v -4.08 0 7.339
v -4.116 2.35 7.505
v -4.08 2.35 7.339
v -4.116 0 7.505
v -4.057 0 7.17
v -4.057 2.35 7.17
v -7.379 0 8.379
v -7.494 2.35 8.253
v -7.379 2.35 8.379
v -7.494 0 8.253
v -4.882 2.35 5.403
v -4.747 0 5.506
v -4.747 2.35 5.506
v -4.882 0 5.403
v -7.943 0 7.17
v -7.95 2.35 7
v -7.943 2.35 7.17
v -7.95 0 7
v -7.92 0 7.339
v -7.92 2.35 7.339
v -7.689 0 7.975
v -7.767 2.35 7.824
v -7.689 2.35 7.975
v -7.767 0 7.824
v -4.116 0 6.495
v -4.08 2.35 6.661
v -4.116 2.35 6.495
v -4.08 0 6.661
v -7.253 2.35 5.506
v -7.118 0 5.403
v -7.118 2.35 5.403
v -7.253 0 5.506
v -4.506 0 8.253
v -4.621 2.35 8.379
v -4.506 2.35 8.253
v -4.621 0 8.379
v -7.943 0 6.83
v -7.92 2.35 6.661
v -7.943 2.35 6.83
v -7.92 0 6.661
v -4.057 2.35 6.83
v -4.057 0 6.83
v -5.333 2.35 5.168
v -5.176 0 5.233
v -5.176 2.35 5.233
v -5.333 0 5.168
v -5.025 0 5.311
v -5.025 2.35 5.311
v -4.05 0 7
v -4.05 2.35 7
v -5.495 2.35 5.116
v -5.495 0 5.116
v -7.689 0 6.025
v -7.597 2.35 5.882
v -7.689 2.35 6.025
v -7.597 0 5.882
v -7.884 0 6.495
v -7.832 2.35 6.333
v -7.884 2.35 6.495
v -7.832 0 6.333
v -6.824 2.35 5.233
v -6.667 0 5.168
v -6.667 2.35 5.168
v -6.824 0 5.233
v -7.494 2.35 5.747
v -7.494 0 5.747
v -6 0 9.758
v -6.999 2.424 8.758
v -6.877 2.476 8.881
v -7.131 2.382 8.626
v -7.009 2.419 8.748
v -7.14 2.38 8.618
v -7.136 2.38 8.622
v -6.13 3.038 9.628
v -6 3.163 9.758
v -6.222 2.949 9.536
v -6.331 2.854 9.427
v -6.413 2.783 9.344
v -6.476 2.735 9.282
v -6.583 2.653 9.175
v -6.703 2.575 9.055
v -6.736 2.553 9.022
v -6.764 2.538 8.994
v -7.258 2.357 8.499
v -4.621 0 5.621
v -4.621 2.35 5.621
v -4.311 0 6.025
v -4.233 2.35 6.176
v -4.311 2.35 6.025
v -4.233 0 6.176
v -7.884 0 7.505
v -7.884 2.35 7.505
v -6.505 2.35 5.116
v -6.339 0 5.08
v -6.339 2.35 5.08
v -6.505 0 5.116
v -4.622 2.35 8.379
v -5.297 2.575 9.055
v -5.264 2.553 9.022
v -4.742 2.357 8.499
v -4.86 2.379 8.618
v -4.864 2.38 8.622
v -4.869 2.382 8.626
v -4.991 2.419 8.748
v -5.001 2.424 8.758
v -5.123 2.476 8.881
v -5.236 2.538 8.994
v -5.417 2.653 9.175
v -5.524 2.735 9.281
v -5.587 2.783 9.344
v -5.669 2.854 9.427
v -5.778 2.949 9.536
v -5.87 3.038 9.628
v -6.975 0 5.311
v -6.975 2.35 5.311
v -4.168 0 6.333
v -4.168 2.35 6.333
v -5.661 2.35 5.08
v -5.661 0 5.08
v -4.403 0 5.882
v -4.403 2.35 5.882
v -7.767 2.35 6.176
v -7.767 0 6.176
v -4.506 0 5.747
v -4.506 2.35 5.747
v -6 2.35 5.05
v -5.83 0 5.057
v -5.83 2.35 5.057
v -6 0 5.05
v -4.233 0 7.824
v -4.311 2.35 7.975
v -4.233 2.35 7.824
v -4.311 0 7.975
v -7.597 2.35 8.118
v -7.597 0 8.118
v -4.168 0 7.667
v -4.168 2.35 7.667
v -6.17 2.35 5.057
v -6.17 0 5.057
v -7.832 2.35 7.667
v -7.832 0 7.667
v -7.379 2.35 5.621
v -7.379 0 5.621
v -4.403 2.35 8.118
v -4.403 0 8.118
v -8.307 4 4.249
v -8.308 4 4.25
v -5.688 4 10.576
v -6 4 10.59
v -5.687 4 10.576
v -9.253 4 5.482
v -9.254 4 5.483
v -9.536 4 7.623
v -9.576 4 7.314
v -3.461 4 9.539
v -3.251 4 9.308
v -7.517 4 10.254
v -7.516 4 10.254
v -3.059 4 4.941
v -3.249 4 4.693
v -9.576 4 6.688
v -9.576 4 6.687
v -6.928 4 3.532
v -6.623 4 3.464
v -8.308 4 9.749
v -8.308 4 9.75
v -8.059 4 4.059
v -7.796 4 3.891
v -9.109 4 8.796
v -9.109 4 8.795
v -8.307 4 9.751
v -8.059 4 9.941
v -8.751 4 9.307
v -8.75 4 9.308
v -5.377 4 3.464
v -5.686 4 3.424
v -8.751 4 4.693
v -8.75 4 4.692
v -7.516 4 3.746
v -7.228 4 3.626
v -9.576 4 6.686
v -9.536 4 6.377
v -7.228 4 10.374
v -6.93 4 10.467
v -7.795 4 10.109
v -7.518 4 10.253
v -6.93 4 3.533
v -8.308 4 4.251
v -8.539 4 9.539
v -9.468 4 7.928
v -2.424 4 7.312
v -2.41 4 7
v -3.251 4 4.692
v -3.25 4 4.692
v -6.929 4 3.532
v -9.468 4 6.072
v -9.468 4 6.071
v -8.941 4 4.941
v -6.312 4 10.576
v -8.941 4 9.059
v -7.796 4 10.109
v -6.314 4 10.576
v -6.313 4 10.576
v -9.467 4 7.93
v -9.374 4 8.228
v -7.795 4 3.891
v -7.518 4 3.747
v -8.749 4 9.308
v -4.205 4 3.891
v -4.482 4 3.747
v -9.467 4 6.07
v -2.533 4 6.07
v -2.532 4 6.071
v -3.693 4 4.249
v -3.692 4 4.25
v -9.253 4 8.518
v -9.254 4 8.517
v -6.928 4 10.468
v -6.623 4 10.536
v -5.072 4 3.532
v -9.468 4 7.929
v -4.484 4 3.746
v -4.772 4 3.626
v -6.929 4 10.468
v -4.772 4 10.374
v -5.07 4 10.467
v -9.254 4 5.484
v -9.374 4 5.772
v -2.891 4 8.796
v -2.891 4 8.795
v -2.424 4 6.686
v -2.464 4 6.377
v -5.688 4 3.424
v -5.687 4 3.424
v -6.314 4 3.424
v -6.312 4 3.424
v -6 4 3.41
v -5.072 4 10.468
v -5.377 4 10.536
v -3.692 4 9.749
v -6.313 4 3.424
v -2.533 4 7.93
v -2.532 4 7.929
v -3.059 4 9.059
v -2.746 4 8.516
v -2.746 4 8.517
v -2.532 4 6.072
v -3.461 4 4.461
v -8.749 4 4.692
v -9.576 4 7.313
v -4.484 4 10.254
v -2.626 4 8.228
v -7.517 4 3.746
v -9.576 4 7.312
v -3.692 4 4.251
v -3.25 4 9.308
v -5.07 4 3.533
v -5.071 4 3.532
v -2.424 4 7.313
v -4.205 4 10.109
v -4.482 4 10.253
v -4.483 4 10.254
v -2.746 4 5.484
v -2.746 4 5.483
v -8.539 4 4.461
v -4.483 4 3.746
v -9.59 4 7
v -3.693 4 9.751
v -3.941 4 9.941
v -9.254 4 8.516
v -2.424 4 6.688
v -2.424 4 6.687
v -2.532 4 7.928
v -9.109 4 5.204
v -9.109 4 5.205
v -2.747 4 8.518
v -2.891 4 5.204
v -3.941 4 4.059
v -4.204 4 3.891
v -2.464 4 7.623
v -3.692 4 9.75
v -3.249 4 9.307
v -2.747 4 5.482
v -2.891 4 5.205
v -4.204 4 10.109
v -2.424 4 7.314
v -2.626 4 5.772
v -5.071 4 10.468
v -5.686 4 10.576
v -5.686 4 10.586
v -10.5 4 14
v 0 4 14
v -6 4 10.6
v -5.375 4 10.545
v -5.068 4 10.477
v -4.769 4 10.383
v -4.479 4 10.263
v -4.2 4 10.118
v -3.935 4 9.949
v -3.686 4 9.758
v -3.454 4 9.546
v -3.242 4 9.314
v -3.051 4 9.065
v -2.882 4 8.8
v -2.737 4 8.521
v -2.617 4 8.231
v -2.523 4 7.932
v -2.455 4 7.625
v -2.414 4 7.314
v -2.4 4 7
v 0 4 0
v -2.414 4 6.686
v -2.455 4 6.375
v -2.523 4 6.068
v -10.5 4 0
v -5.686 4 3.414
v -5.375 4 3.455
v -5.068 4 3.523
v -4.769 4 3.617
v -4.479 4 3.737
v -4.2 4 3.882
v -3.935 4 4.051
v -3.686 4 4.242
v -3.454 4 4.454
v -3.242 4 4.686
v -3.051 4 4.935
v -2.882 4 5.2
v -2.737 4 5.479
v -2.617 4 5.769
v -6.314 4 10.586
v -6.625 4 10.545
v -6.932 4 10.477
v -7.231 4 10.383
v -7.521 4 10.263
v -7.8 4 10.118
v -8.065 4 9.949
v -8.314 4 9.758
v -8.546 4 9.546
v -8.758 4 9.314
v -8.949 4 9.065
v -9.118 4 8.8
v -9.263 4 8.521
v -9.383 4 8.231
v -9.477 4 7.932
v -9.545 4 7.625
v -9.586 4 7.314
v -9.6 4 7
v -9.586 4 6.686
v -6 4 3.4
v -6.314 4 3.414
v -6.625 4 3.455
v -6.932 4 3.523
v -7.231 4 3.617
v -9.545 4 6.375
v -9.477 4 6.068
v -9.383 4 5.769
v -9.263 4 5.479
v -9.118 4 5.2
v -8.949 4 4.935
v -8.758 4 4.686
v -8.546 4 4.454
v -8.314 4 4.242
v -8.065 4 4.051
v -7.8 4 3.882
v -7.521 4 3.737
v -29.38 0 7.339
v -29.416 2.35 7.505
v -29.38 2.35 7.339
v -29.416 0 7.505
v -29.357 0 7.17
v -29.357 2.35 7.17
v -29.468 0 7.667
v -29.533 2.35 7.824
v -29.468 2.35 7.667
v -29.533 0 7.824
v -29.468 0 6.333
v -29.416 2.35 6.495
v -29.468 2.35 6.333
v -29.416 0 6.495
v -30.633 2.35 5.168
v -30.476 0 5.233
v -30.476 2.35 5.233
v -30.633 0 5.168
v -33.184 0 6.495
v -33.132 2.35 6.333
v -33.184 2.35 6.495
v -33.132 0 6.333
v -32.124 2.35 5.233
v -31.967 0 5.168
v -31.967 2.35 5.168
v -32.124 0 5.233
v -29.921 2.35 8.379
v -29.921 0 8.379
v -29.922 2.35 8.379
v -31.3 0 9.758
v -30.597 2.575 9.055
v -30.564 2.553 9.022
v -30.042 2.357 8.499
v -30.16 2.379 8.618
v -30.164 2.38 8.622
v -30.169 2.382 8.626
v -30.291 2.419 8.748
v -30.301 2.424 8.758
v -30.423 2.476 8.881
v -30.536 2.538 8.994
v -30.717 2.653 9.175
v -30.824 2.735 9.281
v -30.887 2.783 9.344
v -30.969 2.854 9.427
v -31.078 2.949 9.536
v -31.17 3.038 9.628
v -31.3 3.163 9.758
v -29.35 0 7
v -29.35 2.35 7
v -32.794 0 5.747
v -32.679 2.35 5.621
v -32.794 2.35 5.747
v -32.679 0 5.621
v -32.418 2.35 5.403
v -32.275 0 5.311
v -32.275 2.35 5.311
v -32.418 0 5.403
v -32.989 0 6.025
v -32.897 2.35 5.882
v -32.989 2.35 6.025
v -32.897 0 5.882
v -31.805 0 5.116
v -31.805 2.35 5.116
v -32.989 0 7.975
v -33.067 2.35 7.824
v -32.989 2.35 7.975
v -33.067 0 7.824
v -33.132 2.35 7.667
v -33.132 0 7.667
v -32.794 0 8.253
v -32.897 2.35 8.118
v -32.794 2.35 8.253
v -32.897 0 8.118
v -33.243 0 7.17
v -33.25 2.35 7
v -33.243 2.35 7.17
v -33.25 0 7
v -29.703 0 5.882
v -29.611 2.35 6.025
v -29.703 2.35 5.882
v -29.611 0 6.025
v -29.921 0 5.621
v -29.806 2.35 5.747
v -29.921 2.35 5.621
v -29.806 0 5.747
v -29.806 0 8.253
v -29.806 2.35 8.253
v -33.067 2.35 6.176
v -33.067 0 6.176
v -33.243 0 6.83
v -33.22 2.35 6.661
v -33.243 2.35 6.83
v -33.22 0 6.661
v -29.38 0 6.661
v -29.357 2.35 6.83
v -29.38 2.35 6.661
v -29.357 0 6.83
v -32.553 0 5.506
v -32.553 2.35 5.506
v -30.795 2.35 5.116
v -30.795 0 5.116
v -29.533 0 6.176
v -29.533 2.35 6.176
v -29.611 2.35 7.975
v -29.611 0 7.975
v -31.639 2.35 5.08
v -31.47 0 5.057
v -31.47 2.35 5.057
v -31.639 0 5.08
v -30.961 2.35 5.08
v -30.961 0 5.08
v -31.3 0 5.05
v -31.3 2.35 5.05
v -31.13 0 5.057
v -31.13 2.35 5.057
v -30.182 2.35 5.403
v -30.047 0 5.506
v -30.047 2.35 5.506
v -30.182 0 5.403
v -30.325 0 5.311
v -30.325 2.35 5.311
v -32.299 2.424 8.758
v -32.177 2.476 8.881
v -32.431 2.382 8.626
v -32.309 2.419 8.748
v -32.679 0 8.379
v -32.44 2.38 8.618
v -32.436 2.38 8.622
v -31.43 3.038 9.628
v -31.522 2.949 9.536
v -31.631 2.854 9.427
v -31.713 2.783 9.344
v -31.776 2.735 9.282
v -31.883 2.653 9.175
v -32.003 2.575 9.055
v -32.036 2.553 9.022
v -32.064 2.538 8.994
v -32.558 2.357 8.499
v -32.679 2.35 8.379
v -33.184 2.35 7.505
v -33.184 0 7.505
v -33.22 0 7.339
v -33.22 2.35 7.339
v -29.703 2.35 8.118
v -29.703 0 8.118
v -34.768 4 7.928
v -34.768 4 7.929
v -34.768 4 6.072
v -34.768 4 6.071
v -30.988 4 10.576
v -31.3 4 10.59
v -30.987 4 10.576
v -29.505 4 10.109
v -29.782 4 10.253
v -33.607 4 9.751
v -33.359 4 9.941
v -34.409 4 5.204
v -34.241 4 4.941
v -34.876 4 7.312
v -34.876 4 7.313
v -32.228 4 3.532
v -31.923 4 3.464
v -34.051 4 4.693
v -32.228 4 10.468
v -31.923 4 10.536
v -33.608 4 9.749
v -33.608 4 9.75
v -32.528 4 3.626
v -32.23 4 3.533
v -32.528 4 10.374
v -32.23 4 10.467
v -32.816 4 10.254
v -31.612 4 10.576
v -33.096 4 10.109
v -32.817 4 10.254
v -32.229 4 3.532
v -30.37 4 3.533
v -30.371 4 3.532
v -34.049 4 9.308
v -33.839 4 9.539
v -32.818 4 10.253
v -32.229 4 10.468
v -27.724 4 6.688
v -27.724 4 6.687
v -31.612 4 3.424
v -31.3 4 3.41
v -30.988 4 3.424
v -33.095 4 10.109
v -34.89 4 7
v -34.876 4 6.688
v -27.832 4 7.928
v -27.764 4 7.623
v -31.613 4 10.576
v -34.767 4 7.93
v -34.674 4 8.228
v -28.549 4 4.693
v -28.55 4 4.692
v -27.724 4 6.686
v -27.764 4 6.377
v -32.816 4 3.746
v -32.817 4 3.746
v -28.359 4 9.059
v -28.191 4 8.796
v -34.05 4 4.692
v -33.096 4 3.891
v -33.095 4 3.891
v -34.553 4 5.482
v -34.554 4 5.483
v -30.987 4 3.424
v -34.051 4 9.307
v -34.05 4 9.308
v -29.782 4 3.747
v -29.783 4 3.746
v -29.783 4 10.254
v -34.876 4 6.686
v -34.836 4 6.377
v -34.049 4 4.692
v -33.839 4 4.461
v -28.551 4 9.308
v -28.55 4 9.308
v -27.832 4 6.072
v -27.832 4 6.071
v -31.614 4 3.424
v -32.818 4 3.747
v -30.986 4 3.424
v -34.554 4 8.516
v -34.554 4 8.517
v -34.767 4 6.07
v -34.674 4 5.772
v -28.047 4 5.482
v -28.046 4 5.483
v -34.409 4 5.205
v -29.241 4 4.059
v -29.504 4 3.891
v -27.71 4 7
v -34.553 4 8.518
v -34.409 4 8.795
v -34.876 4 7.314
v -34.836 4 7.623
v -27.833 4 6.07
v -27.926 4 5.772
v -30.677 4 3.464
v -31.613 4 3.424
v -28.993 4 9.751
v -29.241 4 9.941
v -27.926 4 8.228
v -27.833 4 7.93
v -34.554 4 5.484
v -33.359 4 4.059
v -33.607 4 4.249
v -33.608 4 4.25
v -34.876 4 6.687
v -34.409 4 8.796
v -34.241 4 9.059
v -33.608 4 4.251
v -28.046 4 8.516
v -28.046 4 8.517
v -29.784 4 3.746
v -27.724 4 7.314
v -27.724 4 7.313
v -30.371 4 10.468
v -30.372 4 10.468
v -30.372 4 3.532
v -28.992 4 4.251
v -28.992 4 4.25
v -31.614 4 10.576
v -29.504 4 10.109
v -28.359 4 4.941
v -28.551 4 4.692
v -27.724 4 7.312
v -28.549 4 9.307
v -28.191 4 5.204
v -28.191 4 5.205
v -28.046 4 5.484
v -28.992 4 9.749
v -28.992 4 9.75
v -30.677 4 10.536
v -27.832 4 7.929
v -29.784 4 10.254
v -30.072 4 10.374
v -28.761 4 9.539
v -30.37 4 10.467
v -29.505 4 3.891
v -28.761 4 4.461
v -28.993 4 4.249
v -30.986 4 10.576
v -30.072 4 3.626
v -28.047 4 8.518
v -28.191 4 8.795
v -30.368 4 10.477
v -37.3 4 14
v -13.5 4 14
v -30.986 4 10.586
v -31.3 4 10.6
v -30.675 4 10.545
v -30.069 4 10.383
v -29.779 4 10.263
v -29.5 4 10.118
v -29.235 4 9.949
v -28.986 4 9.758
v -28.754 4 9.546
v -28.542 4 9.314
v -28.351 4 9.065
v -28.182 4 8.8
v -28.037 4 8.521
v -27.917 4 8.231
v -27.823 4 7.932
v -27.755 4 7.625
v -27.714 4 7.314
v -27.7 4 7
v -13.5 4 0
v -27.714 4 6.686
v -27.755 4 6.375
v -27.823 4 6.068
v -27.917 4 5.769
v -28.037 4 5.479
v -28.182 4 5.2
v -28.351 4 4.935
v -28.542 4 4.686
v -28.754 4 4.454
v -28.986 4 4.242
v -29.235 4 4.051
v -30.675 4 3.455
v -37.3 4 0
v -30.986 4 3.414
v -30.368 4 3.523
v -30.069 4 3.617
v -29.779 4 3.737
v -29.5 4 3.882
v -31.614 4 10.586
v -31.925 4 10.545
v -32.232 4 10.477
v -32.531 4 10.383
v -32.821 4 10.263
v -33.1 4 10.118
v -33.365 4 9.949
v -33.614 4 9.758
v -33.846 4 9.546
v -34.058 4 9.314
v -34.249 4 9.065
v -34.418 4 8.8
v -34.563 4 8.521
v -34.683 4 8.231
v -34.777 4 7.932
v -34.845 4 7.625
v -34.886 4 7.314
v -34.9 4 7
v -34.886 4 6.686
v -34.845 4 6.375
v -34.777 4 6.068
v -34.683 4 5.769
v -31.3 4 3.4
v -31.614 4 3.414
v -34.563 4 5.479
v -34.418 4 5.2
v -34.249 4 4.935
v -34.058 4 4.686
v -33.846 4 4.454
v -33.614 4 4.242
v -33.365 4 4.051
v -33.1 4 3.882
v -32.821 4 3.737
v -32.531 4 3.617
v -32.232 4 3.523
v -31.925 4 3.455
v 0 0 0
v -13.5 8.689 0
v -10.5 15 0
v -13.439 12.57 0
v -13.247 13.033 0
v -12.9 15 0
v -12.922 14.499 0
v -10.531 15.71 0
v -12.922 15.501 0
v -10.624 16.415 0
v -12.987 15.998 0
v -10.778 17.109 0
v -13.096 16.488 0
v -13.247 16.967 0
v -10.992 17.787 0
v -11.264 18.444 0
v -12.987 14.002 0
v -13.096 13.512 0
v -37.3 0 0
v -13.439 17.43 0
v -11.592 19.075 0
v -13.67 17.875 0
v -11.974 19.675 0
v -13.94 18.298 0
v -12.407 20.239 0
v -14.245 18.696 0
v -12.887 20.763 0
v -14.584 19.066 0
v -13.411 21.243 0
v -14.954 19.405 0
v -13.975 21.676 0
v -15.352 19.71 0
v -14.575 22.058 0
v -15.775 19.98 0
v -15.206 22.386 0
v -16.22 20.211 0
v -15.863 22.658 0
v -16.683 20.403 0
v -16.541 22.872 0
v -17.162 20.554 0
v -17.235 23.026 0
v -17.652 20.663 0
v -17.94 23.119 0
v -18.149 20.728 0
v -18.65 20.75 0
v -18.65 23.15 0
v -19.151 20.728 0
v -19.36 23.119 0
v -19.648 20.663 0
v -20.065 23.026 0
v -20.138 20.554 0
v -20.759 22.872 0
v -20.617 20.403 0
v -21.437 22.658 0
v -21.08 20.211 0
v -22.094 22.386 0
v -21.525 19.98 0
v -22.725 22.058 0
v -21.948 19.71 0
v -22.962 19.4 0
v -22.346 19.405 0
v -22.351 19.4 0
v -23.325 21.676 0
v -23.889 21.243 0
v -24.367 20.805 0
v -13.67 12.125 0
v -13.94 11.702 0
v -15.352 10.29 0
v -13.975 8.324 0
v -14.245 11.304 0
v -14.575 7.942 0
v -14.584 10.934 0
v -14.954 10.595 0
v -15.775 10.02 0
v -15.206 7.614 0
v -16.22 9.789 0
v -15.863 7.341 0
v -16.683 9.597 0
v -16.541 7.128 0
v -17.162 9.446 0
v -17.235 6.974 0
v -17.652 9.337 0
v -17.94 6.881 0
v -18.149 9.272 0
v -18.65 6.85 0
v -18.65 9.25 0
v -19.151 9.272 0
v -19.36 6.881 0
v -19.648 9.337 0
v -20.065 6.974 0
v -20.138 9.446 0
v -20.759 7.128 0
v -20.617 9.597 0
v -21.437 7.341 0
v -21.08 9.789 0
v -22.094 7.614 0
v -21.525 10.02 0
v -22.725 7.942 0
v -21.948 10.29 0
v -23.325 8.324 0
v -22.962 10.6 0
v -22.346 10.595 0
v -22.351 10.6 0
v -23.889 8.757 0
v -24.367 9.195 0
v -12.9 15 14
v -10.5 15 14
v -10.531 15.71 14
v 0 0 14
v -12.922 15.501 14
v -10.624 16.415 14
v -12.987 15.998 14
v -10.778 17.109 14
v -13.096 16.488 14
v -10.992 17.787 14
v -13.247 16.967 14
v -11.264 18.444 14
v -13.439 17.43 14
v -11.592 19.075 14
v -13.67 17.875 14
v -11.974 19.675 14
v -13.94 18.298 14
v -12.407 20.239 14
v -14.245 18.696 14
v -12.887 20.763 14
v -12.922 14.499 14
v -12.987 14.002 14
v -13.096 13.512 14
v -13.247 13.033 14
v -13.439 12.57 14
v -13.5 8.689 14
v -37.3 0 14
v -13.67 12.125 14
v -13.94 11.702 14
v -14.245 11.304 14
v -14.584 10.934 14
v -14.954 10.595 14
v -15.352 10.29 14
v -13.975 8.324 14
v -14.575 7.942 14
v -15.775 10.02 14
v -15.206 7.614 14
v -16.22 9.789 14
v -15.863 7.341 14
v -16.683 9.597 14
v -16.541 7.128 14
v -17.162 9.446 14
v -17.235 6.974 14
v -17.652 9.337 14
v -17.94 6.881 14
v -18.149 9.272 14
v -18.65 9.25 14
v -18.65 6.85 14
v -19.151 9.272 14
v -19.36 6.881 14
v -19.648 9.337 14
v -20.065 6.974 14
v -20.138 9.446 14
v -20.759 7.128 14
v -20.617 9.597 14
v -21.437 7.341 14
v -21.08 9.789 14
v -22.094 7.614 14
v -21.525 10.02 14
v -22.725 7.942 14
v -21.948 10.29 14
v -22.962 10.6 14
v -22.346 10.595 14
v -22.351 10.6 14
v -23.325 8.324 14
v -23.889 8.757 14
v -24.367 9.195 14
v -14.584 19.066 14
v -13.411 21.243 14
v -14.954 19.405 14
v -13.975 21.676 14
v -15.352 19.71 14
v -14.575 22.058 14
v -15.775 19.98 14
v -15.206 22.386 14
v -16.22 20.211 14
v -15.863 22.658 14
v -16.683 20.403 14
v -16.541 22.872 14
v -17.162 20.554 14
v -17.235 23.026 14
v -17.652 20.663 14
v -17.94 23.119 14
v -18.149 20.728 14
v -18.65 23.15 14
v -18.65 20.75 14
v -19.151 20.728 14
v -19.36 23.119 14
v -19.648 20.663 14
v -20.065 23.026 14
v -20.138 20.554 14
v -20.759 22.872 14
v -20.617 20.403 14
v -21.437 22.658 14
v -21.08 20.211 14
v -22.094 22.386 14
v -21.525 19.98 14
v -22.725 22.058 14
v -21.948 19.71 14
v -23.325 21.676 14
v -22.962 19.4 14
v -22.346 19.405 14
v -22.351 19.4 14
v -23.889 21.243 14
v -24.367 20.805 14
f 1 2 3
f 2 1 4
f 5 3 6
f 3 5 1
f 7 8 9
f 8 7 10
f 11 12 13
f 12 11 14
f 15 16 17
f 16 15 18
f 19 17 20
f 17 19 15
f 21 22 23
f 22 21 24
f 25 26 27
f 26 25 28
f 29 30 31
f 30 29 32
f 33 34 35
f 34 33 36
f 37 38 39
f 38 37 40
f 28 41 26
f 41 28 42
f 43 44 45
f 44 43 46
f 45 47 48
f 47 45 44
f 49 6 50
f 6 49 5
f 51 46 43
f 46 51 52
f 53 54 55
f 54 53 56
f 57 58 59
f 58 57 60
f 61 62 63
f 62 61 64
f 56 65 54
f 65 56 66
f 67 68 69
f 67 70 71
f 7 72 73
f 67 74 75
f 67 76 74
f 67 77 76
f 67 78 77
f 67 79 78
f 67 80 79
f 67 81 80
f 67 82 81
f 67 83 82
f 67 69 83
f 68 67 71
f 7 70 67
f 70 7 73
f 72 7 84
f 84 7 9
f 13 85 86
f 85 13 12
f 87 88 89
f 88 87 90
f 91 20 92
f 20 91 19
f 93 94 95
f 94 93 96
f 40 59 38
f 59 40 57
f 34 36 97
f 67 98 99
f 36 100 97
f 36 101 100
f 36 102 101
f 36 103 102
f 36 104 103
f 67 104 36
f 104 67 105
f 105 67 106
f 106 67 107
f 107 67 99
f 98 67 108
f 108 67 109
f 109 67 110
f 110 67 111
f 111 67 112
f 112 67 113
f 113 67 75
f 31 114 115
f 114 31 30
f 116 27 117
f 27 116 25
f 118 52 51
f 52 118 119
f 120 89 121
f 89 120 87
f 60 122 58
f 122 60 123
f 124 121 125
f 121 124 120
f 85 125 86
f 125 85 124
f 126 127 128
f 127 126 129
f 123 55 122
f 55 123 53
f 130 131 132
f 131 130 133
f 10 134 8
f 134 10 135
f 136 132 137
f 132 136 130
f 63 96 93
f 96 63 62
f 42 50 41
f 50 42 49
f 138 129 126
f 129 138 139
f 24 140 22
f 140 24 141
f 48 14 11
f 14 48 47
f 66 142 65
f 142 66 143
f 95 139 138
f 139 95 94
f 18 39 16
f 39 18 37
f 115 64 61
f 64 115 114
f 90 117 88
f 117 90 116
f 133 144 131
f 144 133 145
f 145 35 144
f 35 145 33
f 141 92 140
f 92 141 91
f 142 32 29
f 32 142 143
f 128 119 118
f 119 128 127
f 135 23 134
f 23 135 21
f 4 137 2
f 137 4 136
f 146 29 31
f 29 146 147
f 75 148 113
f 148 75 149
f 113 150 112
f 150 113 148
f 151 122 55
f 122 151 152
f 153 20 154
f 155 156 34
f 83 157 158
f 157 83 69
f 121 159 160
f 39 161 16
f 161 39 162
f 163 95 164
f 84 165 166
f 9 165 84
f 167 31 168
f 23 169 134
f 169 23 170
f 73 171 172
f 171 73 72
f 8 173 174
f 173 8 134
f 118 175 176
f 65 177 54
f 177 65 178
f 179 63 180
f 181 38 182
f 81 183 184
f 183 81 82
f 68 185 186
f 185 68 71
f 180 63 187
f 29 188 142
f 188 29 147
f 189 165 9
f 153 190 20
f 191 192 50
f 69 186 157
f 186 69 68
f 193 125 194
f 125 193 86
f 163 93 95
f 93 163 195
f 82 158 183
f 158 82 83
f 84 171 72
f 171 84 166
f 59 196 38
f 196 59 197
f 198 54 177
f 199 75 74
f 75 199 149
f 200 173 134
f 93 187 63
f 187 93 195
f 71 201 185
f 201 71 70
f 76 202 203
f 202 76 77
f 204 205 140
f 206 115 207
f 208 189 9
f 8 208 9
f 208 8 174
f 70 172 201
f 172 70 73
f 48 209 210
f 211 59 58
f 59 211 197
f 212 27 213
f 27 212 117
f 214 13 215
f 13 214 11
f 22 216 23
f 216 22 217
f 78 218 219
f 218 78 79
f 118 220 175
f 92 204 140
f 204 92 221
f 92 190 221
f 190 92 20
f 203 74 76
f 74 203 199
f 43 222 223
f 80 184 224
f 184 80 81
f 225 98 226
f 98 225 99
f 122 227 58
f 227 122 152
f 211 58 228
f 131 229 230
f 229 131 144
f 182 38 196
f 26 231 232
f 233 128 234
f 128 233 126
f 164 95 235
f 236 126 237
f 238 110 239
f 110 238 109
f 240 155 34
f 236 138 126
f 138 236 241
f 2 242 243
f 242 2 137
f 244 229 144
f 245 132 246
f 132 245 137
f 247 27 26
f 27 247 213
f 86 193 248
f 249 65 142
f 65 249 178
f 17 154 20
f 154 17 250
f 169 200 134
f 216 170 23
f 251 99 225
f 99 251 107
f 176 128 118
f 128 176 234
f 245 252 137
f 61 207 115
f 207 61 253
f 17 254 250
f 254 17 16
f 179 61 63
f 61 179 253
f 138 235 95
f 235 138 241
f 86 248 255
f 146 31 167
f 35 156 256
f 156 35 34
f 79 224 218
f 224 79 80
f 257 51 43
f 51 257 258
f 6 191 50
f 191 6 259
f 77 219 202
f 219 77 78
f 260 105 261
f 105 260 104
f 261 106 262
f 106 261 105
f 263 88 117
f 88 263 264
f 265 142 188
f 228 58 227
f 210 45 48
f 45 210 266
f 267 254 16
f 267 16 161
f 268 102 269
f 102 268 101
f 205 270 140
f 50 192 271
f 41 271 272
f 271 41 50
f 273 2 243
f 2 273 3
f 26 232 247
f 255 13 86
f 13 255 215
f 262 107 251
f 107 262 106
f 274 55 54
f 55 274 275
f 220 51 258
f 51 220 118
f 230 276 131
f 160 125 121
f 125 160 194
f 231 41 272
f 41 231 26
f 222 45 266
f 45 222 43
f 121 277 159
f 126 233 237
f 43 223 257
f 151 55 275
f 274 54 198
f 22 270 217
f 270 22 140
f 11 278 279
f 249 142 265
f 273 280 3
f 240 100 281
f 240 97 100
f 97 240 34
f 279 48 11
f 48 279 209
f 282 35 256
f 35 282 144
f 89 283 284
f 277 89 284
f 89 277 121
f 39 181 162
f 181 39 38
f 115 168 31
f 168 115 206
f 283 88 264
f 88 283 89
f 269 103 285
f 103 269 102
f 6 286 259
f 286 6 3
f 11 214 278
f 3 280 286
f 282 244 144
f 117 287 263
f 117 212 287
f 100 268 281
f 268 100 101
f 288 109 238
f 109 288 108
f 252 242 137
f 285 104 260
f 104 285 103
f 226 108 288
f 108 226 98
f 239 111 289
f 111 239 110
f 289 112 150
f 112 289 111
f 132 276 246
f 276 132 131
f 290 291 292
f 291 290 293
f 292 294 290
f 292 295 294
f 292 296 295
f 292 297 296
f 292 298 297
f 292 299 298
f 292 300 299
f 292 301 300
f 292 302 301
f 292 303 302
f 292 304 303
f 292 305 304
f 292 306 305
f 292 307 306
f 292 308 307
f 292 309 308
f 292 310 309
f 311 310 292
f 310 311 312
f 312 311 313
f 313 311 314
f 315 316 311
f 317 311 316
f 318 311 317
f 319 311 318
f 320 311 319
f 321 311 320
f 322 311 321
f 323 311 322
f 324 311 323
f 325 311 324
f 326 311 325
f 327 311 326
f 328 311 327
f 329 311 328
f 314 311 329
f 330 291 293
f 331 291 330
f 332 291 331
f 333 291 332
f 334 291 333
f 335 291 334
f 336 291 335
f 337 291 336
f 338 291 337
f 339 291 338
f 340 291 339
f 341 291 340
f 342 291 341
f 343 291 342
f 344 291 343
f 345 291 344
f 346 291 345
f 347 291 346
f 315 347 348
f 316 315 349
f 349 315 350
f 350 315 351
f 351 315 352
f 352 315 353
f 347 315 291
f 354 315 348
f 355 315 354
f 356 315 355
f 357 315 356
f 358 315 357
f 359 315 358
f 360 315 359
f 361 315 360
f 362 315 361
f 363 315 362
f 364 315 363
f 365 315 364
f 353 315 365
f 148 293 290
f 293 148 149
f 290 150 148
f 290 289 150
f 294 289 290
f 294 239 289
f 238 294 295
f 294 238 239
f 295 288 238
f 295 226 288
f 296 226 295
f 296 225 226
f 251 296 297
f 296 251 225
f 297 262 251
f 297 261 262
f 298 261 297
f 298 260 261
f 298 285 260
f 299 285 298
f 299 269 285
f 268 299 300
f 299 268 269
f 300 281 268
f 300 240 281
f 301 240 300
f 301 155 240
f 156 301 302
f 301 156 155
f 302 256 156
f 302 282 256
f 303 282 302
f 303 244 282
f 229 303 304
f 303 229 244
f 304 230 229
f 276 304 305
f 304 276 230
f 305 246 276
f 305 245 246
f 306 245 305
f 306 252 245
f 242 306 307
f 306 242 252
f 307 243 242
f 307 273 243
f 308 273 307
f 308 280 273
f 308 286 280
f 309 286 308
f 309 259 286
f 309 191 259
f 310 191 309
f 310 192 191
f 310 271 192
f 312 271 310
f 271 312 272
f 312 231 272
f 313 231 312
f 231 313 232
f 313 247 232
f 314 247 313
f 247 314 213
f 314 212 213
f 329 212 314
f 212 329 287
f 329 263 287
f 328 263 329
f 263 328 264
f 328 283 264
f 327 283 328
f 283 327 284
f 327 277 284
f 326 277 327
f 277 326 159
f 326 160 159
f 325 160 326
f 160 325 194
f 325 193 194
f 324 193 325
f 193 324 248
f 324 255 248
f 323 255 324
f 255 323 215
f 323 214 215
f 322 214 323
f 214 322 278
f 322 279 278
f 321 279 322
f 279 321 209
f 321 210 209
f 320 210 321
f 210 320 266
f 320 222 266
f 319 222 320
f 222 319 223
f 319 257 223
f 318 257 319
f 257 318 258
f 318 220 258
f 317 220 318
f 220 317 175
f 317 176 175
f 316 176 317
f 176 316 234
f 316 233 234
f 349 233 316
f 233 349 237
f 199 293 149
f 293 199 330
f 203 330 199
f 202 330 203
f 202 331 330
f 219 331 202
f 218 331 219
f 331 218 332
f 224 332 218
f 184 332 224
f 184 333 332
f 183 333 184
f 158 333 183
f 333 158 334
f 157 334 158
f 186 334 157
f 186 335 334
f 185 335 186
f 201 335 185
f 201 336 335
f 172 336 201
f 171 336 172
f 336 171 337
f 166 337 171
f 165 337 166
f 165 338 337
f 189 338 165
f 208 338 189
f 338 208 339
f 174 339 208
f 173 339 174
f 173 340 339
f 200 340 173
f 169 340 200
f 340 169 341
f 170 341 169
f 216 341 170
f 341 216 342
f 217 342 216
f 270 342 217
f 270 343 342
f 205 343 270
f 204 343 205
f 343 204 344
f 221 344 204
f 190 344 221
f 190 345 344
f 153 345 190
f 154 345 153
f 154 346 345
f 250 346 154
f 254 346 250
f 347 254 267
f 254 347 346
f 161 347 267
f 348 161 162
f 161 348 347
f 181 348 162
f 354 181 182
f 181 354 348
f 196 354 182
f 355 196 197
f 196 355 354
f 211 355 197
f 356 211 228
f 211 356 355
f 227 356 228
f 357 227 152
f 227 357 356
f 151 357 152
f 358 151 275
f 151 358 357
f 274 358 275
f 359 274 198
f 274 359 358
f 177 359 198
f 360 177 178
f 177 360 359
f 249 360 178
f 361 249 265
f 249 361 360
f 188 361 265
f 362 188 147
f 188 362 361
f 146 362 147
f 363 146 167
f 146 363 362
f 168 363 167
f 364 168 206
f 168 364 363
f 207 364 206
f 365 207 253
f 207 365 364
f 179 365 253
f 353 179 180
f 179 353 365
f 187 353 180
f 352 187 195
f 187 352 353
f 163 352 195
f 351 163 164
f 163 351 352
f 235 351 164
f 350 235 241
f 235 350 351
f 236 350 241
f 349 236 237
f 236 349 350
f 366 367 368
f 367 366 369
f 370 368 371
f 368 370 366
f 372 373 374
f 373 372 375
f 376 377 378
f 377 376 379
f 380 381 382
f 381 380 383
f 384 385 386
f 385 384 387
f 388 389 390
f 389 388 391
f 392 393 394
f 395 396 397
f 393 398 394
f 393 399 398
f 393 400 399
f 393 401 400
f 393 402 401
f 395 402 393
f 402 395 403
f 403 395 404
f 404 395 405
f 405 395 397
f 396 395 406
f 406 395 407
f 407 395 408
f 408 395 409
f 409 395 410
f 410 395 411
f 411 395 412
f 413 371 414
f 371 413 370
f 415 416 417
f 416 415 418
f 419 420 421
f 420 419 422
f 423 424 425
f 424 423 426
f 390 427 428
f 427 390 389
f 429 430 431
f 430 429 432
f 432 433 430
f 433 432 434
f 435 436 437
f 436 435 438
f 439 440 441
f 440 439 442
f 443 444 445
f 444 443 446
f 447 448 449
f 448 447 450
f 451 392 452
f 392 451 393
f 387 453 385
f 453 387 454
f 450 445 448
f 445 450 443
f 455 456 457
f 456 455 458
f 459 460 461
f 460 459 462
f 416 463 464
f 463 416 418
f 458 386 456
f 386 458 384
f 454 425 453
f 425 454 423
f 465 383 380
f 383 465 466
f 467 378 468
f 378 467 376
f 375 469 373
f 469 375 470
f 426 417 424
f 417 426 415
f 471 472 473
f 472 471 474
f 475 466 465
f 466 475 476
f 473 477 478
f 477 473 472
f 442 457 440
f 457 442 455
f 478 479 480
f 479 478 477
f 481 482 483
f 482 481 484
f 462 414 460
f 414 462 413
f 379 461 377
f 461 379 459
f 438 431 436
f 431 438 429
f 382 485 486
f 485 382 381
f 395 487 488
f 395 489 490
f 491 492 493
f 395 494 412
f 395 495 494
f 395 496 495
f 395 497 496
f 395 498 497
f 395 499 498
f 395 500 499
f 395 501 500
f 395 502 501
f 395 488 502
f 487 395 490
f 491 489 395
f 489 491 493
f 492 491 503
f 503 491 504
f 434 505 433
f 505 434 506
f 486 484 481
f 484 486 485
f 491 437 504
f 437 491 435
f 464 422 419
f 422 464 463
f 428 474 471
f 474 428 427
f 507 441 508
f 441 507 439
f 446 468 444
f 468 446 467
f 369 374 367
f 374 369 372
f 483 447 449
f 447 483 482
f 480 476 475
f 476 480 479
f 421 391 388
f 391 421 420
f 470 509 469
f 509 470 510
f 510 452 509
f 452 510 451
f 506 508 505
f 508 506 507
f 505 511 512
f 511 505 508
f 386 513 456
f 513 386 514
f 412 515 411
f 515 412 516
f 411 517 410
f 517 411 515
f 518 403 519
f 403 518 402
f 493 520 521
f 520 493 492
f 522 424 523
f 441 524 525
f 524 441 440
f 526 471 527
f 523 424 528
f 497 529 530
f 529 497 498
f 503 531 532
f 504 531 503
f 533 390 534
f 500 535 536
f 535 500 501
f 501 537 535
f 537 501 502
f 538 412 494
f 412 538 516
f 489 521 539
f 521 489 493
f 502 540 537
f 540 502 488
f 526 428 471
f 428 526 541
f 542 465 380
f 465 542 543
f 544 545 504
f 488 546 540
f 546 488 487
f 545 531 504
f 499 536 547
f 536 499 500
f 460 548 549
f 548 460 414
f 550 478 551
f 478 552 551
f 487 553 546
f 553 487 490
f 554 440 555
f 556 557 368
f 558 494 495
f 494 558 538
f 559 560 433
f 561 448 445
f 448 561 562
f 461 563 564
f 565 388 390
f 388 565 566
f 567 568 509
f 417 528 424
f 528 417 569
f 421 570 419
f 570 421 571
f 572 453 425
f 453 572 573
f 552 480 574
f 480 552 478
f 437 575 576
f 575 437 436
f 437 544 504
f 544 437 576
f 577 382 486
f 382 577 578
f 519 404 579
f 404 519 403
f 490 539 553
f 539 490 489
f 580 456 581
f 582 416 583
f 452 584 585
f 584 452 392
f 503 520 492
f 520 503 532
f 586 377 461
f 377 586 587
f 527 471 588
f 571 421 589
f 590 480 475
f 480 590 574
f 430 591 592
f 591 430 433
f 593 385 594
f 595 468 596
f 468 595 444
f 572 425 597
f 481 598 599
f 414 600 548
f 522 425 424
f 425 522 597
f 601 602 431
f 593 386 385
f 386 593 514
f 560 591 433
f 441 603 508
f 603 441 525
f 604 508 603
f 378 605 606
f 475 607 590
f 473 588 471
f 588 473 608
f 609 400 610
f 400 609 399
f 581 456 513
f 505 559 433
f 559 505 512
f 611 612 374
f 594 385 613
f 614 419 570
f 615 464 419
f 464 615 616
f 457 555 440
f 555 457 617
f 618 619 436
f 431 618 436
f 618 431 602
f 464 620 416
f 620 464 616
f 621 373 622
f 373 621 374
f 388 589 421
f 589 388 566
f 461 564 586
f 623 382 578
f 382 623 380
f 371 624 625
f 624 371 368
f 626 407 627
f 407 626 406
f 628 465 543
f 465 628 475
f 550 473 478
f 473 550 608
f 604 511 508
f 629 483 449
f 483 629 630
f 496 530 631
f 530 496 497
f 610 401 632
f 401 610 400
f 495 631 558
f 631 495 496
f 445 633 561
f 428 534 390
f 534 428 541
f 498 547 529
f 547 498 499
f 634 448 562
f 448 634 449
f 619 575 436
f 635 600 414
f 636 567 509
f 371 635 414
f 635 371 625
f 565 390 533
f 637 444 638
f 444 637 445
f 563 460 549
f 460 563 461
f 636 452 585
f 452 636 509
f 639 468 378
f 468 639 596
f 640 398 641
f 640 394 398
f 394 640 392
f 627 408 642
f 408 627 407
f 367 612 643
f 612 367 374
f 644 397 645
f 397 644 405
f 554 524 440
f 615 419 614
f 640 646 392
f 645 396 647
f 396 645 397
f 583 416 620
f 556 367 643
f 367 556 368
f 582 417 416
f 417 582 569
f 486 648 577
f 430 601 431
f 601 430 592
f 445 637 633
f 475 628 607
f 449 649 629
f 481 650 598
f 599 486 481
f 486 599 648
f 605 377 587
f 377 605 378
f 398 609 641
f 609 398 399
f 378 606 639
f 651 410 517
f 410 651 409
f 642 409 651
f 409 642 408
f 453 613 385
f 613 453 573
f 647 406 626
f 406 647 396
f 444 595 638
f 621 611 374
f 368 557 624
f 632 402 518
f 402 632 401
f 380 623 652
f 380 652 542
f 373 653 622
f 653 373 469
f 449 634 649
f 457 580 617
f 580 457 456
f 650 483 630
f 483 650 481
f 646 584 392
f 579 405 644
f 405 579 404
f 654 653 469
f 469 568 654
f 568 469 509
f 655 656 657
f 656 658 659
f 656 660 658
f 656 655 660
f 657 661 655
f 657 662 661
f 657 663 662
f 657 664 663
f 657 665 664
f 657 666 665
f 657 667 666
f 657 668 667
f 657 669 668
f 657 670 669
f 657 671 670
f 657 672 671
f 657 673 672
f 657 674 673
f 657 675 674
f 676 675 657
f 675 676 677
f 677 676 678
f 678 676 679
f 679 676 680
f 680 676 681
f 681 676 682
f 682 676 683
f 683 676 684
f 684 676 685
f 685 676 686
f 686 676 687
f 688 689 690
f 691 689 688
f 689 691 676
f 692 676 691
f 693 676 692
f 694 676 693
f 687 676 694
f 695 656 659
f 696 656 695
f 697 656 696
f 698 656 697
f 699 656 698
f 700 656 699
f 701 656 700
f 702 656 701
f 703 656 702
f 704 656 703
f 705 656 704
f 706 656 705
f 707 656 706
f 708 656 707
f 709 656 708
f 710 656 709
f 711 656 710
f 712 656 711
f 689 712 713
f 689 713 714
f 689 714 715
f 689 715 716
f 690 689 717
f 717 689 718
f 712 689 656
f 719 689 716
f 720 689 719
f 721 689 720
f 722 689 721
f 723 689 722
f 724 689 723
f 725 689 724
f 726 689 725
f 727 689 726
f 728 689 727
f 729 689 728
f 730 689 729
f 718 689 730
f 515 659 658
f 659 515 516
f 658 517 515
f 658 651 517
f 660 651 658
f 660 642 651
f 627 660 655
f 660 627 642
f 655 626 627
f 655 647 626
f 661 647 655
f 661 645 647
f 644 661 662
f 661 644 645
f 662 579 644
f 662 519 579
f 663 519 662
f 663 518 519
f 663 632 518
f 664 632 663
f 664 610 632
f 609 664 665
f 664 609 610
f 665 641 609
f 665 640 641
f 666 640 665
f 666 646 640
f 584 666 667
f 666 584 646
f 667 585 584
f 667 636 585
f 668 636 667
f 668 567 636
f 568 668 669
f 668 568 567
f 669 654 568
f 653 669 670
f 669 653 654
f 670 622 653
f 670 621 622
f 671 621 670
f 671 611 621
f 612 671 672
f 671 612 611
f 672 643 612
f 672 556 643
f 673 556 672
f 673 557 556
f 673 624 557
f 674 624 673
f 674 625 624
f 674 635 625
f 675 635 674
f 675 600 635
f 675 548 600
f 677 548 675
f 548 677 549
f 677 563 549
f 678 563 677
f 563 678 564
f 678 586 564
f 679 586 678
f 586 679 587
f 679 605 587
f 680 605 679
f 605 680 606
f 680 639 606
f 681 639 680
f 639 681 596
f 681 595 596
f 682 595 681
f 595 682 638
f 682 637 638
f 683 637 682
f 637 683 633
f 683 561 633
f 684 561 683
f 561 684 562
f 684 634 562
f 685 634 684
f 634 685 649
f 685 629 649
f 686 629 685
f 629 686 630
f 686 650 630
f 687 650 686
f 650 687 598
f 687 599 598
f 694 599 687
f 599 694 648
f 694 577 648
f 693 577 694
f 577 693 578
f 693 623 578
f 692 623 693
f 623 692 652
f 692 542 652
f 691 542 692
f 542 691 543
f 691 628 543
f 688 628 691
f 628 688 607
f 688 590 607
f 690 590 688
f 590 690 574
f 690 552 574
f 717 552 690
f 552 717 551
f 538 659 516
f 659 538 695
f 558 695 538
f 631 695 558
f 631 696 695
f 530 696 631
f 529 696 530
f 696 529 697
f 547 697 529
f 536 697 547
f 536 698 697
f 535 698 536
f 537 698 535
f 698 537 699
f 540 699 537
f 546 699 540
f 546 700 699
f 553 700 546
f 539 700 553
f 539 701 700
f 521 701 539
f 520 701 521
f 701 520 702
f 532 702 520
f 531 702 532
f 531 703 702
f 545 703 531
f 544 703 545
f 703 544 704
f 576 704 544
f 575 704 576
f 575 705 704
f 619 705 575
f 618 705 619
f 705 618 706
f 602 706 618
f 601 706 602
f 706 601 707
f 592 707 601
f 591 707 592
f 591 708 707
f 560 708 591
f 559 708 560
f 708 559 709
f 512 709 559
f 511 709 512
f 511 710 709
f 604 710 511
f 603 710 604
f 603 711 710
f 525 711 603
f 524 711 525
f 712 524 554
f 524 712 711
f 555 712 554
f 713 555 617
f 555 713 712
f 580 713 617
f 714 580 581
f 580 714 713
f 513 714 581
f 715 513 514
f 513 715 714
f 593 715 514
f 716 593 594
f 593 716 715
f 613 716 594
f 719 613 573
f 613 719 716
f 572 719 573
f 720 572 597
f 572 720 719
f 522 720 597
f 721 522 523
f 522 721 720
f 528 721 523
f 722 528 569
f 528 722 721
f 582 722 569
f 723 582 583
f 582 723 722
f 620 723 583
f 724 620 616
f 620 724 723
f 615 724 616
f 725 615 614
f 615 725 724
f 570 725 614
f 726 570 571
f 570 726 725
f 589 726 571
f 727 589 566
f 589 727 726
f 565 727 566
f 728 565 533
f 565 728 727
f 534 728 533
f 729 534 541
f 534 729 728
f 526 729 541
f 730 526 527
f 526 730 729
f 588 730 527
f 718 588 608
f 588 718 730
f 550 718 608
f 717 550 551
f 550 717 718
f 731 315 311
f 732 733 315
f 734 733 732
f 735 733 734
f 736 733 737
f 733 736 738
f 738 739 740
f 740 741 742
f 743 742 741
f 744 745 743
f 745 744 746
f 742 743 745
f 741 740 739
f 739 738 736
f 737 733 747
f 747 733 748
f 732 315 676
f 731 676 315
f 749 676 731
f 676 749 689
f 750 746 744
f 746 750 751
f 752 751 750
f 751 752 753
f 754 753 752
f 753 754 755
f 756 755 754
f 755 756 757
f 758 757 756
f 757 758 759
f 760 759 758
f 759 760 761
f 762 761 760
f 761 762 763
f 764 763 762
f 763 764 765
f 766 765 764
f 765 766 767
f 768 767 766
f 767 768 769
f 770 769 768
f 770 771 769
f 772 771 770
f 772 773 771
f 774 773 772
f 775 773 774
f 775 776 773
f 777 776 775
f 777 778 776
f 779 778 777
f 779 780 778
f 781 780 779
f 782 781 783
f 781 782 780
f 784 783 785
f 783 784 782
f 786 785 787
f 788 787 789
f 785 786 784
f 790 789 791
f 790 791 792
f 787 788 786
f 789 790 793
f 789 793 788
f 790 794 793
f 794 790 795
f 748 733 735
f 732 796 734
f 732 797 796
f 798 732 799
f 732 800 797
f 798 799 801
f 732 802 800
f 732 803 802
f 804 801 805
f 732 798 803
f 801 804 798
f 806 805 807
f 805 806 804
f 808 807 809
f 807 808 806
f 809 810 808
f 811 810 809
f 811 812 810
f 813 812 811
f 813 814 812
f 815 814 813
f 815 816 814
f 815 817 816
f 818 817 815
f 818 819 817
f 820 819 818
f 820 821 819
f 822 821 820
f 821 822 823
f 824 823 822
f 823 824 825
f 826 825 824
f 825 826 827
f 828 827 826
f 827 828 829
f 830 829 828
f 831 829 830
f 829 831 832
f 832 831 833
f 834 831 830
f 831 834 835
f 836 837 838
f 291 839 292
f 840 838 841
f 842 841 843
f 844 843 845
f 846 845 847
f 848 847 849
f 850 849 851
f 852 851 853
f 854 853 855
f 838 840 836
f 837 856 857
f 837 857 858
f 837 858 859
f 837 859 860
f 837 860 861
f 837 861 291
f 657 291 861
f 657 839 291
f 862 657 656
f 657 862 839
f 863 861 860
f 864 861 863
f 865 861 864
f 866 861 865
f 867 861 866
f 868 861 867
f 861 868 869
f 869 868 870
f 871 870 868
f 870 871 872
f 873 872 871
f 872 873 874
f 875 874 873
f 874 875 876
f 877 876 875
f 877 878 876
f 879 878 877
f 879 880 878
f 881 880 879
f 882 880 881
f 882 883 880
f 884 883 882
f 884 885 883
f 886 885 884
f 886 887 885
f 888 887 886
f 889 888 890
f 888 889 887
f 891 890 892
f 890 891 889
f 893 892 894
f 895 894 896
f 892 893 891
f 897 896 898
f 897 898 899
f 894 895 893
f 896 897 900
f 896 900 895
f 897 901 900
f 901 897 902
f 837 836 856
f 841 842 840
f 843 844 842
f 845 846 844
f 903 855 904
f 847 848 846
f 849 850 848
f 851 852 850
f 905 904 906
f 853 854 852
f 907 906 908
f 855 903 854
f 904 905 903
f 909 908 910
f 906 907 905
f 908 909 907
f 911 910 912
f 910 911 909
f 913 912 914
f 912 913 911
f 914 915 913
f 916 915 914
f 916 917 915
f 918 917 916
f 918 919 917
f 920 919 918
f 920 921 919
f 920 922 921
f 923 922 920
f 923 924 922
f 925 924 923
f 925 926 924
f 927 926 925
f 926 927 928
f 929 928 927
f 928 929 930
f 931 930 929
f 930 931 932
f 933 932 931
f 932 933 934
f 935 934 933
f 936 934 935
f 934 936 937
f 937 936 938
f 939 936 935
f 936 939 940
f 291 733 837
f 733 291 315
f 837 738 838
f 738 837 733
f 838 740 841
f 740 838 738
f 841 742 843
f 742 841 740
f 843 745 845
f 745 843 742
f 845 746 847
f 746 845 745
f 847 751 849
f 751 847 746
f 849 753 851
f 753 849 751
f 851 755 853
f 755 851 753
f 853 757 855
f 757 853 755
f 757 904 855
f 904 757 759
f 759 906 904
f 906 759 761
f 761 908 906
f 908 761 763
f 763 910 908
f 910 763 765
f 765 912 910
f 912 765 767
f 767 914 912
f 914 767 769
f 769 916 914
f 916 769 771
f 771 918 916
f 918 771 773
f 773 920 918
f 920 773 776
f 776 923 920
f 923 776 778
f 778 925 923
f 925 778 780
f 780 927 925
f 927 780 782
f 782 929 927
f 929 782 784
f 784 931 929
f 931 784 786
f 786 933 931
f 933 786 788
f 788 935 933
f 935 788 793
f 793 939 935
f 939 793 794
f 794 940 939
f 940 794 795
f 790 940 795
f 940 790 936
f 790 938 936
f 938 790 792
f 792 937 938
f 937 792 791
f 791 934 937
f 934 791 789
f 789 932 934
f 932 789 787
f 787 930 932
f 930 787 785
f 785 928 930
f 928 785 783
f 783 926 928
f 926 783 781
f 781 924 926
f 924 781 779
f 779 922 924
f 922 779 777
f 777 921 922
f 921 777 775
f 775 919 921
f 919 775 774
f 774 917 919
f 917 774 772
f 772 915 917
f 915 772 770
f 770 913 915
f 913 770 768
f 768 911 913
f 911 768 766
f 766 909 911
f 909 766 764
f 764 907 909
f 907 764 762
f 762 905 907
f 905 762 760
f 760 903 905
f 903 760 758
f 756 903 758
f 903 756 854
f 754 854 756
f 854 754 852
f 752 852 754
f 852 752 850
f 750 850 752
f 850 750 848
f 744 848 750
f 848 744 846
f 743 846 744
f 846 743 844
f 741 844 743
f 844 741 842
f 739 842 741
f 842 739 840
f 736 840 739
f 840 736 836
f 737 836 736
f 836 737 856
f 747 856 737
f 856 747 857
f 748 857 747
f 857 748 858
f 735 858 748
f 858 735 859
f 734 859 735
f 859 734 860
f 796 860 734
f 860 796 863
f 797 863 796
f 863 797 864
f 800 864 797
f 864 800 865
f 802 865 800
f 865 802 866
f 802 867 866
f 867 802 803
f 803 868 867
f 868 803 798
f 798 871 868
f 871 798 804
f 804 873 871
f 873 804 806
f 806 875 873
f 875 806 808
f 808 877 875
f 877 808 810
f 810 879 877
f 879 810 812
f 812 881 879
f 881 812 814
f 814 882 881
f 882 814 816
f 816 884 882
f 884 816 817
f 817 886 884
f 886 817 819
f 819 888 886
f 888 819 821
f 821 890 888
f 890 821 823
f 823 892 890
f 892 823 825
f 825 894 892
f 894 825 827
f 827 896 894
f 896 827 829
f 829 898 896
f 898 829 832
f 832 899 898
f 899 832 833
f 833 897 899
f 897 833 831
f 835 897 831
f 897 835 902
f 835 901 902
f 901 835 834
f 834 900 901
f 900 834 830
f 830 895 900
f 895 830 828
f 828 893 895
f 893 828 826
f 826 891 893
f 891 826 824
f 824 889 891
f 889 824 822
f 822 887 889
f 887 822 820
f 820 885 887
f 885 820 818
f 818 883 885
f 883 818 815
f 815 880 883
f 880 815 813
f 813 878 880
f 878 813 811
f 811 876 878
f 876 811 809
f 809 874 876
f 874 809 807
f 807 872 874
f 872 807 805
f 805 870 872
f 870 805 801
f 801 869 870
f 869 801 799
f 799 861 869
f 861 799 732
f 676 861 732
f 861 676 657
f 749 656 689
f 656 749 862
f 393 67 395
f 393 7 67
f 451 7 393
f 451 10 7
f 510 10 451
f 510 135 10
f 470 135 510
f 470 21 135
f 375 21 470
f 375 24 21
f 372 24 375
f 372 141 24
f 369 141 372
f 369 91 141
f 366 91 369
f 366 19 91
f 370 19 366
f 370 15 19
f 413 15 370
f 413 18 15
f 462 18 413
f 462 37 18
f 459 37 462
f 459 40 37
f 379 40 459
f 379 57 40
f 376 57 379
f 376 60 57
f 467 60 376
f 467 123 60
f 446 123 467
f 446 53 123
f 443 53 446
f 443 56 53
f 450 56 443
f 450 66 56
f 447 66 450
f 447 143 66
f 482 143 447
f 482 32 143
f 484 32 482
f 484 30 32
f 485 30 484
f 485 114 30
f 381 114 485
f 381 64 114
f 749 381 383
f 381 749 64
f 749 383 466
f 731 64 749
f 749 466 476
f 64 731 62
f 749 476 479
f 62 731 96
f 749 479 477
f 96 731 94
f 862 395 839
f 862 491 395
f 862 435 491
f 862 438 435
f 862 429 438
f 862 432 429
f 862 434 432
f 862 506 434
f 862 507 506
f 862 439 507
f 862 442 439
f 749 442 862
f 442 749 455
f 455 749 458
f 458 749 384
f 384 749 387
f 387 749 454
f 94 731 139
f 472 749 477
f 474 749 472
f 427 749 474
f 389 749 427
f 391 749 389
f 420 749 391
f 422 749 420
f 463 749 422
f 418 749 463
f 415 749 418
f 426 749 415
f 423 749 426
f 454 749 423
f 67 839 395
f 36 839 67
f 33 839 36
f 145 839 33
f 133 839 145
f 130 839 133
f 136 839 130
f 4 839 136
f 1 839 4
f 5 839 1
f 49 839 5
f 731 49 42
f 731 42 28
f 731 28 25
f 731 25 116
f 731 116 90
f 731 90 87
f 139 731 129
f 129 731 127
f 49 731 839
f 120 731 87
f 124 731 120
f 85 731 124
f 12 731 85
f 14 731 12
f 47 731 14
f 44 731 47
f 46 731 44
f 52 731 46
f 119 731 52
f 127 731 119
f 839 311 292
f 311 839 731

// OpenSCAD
// Curtain-rod hook v1 - SNAP-FIT C-CLIP (screw or VHB mount)
// Push the rod down through the funnel: the C-ring lips spread 1.2 mm and click shut.
// Units mm. In-use coordinates: X = along the rod, Y = out from the frame, Z = up.
// PART = "print"   -> one hook laid flat, ready for STL export (print 2)
//        "assembly" -> in-use orientation with a short piece of rod (for viewing only)

/* [What to show] */
PART = "print";        // ["print", "assembly"]
MOUNT = "screw";       // ["screw", "vhb"]

/* [Rod] */
ROD_D = 10;            // rod diameter
ROD_CLEAR = 1.5;       // diametral clearance (rod turns/slides freely)
ROD_OFFSET = 15;       // rod axis -> frame face
SNAP = 1.2;            // mouth is this much narrower than the rod (1.0-1.5 for ASA/ABS)

/* [Body] */
WIDTH = 14;            // along the rod (= base width on the frame)
BASE_T = 4;            // base plate thickness
WALL = 2.4;            // ring wall
BAR_T = 3;             // web tying the ring bottom to the base
FUNNEL = 3;            // 45 deg lead-in above the lips

/* [Mount] */
SCREW_HOLE = 3.9;      // clearance for 3.5 mm self-tapping screw
CSK_D = 7.2;           // 90 deg countersink diameter
SCREW_EDGE = 6;        // screw axis from base end
ACCESS = 4.5;          // screw axis to nearest hook feature (screwdriver room)
PLATE_W = 20;          // VHB plate width (19 mm tape)

$fn = 72;
R_IN = (ROD_D + ROD_CLEAR) / 2;
R_OUT = R_IN + WALL;
D = ROD_OFFSET;
ZC = SCREW_EDGE + ACCESS + R_OUT;
Z_SCREWS = [SCREW_EDGE, ZC + R_OUT + ACCESS];
HEIGHT = Z_SCREWS[1] + SCREW_EDGE;
MOUTH = ROD_D - SNAP;
ZF = ZC + R_IN * 0.75;

module rect(y0, y1, z0, z1) translate([y0, z0]) square([y1 - y0, z1 - z0]);
// 2D profile (u = Y, v = Z) extruded along X from x0
module inuse(w, x0 = 0) translate([x0, 0, 0]) rotate([90, 0, 90]) linear_extrude(w, convexity = 8) children();
module tear2d(r) { circle(r); translate([r * 0.7071, 0]) rotate(45) square(r, center = true); }

// countersunk hole along Y, head at the base front, teardrop tip toward +X (up when printed)
module csk_hole(x, z) {
    r = SCREW_HOLE / 2; h = (CSK_D - SCREW_HOLE) / 2;
    translate([x, 0, z]) {
        translate([0, 50, 0]) rotate([90, 0, 0]) linear_extrude(100, convexity = 4) tear2d(r);
        translate([0, BASE_T - h, 0]) rotate([-90, 0, 0]) cylinder(h = h + 0.01, r1 = r, r2 = CSK_D / 2);
        translate([0, BASE_T, 0]) rotate([-90, 0, 0]) cylinder(h = 1, r = CSK_D / 2);
    }
}

module profile() difference() {
    union() {
        rect(0, BASE_T, 0, HEIGHT);
        rect(0, D, ZC - R_OUT, ZC - R_OUT + BAR_T);
        translate([D, ZC]) circle(R_OUT);
    }
    translate([D, ZC]) circle(R_IN);
    rect(D - MOUTH / 2, D + MOUTH / 2, ZC, ZC + R_OUT + 1);
    polygon([[D - MOUTH / 2, ZF], [D + MOUTH / 2, ZF],
             [D + MOUTH / 2 + FUNNEL, ZF + FUNNEL], [D - MOUTH / 2 - FUNNEL, ZF + FUNNEL]]);
}

module hook() difference() {
    union() {
        inuse(WIDTH) profile();
        if (MOUNT == "vhb") cube([PLATE_W, BASE_T, HEIGHT]);
    }
    if (MOUNT == "screw") for (z = Z_SCREWS) csk_hole(WIDTH / 2, z);
}

module rod() color("Gainsboro") translate([-25, D, ZC - ROD_CLEAR / 2]) rotate([0, 90, 0]) cylinder(d = ROD_D, h = 25);

if (PART == "print") rotate([0, -90, 0]) hook();   // x = 0 side face on the bed
else { color("SteelBlue") hook(); rod(); }
